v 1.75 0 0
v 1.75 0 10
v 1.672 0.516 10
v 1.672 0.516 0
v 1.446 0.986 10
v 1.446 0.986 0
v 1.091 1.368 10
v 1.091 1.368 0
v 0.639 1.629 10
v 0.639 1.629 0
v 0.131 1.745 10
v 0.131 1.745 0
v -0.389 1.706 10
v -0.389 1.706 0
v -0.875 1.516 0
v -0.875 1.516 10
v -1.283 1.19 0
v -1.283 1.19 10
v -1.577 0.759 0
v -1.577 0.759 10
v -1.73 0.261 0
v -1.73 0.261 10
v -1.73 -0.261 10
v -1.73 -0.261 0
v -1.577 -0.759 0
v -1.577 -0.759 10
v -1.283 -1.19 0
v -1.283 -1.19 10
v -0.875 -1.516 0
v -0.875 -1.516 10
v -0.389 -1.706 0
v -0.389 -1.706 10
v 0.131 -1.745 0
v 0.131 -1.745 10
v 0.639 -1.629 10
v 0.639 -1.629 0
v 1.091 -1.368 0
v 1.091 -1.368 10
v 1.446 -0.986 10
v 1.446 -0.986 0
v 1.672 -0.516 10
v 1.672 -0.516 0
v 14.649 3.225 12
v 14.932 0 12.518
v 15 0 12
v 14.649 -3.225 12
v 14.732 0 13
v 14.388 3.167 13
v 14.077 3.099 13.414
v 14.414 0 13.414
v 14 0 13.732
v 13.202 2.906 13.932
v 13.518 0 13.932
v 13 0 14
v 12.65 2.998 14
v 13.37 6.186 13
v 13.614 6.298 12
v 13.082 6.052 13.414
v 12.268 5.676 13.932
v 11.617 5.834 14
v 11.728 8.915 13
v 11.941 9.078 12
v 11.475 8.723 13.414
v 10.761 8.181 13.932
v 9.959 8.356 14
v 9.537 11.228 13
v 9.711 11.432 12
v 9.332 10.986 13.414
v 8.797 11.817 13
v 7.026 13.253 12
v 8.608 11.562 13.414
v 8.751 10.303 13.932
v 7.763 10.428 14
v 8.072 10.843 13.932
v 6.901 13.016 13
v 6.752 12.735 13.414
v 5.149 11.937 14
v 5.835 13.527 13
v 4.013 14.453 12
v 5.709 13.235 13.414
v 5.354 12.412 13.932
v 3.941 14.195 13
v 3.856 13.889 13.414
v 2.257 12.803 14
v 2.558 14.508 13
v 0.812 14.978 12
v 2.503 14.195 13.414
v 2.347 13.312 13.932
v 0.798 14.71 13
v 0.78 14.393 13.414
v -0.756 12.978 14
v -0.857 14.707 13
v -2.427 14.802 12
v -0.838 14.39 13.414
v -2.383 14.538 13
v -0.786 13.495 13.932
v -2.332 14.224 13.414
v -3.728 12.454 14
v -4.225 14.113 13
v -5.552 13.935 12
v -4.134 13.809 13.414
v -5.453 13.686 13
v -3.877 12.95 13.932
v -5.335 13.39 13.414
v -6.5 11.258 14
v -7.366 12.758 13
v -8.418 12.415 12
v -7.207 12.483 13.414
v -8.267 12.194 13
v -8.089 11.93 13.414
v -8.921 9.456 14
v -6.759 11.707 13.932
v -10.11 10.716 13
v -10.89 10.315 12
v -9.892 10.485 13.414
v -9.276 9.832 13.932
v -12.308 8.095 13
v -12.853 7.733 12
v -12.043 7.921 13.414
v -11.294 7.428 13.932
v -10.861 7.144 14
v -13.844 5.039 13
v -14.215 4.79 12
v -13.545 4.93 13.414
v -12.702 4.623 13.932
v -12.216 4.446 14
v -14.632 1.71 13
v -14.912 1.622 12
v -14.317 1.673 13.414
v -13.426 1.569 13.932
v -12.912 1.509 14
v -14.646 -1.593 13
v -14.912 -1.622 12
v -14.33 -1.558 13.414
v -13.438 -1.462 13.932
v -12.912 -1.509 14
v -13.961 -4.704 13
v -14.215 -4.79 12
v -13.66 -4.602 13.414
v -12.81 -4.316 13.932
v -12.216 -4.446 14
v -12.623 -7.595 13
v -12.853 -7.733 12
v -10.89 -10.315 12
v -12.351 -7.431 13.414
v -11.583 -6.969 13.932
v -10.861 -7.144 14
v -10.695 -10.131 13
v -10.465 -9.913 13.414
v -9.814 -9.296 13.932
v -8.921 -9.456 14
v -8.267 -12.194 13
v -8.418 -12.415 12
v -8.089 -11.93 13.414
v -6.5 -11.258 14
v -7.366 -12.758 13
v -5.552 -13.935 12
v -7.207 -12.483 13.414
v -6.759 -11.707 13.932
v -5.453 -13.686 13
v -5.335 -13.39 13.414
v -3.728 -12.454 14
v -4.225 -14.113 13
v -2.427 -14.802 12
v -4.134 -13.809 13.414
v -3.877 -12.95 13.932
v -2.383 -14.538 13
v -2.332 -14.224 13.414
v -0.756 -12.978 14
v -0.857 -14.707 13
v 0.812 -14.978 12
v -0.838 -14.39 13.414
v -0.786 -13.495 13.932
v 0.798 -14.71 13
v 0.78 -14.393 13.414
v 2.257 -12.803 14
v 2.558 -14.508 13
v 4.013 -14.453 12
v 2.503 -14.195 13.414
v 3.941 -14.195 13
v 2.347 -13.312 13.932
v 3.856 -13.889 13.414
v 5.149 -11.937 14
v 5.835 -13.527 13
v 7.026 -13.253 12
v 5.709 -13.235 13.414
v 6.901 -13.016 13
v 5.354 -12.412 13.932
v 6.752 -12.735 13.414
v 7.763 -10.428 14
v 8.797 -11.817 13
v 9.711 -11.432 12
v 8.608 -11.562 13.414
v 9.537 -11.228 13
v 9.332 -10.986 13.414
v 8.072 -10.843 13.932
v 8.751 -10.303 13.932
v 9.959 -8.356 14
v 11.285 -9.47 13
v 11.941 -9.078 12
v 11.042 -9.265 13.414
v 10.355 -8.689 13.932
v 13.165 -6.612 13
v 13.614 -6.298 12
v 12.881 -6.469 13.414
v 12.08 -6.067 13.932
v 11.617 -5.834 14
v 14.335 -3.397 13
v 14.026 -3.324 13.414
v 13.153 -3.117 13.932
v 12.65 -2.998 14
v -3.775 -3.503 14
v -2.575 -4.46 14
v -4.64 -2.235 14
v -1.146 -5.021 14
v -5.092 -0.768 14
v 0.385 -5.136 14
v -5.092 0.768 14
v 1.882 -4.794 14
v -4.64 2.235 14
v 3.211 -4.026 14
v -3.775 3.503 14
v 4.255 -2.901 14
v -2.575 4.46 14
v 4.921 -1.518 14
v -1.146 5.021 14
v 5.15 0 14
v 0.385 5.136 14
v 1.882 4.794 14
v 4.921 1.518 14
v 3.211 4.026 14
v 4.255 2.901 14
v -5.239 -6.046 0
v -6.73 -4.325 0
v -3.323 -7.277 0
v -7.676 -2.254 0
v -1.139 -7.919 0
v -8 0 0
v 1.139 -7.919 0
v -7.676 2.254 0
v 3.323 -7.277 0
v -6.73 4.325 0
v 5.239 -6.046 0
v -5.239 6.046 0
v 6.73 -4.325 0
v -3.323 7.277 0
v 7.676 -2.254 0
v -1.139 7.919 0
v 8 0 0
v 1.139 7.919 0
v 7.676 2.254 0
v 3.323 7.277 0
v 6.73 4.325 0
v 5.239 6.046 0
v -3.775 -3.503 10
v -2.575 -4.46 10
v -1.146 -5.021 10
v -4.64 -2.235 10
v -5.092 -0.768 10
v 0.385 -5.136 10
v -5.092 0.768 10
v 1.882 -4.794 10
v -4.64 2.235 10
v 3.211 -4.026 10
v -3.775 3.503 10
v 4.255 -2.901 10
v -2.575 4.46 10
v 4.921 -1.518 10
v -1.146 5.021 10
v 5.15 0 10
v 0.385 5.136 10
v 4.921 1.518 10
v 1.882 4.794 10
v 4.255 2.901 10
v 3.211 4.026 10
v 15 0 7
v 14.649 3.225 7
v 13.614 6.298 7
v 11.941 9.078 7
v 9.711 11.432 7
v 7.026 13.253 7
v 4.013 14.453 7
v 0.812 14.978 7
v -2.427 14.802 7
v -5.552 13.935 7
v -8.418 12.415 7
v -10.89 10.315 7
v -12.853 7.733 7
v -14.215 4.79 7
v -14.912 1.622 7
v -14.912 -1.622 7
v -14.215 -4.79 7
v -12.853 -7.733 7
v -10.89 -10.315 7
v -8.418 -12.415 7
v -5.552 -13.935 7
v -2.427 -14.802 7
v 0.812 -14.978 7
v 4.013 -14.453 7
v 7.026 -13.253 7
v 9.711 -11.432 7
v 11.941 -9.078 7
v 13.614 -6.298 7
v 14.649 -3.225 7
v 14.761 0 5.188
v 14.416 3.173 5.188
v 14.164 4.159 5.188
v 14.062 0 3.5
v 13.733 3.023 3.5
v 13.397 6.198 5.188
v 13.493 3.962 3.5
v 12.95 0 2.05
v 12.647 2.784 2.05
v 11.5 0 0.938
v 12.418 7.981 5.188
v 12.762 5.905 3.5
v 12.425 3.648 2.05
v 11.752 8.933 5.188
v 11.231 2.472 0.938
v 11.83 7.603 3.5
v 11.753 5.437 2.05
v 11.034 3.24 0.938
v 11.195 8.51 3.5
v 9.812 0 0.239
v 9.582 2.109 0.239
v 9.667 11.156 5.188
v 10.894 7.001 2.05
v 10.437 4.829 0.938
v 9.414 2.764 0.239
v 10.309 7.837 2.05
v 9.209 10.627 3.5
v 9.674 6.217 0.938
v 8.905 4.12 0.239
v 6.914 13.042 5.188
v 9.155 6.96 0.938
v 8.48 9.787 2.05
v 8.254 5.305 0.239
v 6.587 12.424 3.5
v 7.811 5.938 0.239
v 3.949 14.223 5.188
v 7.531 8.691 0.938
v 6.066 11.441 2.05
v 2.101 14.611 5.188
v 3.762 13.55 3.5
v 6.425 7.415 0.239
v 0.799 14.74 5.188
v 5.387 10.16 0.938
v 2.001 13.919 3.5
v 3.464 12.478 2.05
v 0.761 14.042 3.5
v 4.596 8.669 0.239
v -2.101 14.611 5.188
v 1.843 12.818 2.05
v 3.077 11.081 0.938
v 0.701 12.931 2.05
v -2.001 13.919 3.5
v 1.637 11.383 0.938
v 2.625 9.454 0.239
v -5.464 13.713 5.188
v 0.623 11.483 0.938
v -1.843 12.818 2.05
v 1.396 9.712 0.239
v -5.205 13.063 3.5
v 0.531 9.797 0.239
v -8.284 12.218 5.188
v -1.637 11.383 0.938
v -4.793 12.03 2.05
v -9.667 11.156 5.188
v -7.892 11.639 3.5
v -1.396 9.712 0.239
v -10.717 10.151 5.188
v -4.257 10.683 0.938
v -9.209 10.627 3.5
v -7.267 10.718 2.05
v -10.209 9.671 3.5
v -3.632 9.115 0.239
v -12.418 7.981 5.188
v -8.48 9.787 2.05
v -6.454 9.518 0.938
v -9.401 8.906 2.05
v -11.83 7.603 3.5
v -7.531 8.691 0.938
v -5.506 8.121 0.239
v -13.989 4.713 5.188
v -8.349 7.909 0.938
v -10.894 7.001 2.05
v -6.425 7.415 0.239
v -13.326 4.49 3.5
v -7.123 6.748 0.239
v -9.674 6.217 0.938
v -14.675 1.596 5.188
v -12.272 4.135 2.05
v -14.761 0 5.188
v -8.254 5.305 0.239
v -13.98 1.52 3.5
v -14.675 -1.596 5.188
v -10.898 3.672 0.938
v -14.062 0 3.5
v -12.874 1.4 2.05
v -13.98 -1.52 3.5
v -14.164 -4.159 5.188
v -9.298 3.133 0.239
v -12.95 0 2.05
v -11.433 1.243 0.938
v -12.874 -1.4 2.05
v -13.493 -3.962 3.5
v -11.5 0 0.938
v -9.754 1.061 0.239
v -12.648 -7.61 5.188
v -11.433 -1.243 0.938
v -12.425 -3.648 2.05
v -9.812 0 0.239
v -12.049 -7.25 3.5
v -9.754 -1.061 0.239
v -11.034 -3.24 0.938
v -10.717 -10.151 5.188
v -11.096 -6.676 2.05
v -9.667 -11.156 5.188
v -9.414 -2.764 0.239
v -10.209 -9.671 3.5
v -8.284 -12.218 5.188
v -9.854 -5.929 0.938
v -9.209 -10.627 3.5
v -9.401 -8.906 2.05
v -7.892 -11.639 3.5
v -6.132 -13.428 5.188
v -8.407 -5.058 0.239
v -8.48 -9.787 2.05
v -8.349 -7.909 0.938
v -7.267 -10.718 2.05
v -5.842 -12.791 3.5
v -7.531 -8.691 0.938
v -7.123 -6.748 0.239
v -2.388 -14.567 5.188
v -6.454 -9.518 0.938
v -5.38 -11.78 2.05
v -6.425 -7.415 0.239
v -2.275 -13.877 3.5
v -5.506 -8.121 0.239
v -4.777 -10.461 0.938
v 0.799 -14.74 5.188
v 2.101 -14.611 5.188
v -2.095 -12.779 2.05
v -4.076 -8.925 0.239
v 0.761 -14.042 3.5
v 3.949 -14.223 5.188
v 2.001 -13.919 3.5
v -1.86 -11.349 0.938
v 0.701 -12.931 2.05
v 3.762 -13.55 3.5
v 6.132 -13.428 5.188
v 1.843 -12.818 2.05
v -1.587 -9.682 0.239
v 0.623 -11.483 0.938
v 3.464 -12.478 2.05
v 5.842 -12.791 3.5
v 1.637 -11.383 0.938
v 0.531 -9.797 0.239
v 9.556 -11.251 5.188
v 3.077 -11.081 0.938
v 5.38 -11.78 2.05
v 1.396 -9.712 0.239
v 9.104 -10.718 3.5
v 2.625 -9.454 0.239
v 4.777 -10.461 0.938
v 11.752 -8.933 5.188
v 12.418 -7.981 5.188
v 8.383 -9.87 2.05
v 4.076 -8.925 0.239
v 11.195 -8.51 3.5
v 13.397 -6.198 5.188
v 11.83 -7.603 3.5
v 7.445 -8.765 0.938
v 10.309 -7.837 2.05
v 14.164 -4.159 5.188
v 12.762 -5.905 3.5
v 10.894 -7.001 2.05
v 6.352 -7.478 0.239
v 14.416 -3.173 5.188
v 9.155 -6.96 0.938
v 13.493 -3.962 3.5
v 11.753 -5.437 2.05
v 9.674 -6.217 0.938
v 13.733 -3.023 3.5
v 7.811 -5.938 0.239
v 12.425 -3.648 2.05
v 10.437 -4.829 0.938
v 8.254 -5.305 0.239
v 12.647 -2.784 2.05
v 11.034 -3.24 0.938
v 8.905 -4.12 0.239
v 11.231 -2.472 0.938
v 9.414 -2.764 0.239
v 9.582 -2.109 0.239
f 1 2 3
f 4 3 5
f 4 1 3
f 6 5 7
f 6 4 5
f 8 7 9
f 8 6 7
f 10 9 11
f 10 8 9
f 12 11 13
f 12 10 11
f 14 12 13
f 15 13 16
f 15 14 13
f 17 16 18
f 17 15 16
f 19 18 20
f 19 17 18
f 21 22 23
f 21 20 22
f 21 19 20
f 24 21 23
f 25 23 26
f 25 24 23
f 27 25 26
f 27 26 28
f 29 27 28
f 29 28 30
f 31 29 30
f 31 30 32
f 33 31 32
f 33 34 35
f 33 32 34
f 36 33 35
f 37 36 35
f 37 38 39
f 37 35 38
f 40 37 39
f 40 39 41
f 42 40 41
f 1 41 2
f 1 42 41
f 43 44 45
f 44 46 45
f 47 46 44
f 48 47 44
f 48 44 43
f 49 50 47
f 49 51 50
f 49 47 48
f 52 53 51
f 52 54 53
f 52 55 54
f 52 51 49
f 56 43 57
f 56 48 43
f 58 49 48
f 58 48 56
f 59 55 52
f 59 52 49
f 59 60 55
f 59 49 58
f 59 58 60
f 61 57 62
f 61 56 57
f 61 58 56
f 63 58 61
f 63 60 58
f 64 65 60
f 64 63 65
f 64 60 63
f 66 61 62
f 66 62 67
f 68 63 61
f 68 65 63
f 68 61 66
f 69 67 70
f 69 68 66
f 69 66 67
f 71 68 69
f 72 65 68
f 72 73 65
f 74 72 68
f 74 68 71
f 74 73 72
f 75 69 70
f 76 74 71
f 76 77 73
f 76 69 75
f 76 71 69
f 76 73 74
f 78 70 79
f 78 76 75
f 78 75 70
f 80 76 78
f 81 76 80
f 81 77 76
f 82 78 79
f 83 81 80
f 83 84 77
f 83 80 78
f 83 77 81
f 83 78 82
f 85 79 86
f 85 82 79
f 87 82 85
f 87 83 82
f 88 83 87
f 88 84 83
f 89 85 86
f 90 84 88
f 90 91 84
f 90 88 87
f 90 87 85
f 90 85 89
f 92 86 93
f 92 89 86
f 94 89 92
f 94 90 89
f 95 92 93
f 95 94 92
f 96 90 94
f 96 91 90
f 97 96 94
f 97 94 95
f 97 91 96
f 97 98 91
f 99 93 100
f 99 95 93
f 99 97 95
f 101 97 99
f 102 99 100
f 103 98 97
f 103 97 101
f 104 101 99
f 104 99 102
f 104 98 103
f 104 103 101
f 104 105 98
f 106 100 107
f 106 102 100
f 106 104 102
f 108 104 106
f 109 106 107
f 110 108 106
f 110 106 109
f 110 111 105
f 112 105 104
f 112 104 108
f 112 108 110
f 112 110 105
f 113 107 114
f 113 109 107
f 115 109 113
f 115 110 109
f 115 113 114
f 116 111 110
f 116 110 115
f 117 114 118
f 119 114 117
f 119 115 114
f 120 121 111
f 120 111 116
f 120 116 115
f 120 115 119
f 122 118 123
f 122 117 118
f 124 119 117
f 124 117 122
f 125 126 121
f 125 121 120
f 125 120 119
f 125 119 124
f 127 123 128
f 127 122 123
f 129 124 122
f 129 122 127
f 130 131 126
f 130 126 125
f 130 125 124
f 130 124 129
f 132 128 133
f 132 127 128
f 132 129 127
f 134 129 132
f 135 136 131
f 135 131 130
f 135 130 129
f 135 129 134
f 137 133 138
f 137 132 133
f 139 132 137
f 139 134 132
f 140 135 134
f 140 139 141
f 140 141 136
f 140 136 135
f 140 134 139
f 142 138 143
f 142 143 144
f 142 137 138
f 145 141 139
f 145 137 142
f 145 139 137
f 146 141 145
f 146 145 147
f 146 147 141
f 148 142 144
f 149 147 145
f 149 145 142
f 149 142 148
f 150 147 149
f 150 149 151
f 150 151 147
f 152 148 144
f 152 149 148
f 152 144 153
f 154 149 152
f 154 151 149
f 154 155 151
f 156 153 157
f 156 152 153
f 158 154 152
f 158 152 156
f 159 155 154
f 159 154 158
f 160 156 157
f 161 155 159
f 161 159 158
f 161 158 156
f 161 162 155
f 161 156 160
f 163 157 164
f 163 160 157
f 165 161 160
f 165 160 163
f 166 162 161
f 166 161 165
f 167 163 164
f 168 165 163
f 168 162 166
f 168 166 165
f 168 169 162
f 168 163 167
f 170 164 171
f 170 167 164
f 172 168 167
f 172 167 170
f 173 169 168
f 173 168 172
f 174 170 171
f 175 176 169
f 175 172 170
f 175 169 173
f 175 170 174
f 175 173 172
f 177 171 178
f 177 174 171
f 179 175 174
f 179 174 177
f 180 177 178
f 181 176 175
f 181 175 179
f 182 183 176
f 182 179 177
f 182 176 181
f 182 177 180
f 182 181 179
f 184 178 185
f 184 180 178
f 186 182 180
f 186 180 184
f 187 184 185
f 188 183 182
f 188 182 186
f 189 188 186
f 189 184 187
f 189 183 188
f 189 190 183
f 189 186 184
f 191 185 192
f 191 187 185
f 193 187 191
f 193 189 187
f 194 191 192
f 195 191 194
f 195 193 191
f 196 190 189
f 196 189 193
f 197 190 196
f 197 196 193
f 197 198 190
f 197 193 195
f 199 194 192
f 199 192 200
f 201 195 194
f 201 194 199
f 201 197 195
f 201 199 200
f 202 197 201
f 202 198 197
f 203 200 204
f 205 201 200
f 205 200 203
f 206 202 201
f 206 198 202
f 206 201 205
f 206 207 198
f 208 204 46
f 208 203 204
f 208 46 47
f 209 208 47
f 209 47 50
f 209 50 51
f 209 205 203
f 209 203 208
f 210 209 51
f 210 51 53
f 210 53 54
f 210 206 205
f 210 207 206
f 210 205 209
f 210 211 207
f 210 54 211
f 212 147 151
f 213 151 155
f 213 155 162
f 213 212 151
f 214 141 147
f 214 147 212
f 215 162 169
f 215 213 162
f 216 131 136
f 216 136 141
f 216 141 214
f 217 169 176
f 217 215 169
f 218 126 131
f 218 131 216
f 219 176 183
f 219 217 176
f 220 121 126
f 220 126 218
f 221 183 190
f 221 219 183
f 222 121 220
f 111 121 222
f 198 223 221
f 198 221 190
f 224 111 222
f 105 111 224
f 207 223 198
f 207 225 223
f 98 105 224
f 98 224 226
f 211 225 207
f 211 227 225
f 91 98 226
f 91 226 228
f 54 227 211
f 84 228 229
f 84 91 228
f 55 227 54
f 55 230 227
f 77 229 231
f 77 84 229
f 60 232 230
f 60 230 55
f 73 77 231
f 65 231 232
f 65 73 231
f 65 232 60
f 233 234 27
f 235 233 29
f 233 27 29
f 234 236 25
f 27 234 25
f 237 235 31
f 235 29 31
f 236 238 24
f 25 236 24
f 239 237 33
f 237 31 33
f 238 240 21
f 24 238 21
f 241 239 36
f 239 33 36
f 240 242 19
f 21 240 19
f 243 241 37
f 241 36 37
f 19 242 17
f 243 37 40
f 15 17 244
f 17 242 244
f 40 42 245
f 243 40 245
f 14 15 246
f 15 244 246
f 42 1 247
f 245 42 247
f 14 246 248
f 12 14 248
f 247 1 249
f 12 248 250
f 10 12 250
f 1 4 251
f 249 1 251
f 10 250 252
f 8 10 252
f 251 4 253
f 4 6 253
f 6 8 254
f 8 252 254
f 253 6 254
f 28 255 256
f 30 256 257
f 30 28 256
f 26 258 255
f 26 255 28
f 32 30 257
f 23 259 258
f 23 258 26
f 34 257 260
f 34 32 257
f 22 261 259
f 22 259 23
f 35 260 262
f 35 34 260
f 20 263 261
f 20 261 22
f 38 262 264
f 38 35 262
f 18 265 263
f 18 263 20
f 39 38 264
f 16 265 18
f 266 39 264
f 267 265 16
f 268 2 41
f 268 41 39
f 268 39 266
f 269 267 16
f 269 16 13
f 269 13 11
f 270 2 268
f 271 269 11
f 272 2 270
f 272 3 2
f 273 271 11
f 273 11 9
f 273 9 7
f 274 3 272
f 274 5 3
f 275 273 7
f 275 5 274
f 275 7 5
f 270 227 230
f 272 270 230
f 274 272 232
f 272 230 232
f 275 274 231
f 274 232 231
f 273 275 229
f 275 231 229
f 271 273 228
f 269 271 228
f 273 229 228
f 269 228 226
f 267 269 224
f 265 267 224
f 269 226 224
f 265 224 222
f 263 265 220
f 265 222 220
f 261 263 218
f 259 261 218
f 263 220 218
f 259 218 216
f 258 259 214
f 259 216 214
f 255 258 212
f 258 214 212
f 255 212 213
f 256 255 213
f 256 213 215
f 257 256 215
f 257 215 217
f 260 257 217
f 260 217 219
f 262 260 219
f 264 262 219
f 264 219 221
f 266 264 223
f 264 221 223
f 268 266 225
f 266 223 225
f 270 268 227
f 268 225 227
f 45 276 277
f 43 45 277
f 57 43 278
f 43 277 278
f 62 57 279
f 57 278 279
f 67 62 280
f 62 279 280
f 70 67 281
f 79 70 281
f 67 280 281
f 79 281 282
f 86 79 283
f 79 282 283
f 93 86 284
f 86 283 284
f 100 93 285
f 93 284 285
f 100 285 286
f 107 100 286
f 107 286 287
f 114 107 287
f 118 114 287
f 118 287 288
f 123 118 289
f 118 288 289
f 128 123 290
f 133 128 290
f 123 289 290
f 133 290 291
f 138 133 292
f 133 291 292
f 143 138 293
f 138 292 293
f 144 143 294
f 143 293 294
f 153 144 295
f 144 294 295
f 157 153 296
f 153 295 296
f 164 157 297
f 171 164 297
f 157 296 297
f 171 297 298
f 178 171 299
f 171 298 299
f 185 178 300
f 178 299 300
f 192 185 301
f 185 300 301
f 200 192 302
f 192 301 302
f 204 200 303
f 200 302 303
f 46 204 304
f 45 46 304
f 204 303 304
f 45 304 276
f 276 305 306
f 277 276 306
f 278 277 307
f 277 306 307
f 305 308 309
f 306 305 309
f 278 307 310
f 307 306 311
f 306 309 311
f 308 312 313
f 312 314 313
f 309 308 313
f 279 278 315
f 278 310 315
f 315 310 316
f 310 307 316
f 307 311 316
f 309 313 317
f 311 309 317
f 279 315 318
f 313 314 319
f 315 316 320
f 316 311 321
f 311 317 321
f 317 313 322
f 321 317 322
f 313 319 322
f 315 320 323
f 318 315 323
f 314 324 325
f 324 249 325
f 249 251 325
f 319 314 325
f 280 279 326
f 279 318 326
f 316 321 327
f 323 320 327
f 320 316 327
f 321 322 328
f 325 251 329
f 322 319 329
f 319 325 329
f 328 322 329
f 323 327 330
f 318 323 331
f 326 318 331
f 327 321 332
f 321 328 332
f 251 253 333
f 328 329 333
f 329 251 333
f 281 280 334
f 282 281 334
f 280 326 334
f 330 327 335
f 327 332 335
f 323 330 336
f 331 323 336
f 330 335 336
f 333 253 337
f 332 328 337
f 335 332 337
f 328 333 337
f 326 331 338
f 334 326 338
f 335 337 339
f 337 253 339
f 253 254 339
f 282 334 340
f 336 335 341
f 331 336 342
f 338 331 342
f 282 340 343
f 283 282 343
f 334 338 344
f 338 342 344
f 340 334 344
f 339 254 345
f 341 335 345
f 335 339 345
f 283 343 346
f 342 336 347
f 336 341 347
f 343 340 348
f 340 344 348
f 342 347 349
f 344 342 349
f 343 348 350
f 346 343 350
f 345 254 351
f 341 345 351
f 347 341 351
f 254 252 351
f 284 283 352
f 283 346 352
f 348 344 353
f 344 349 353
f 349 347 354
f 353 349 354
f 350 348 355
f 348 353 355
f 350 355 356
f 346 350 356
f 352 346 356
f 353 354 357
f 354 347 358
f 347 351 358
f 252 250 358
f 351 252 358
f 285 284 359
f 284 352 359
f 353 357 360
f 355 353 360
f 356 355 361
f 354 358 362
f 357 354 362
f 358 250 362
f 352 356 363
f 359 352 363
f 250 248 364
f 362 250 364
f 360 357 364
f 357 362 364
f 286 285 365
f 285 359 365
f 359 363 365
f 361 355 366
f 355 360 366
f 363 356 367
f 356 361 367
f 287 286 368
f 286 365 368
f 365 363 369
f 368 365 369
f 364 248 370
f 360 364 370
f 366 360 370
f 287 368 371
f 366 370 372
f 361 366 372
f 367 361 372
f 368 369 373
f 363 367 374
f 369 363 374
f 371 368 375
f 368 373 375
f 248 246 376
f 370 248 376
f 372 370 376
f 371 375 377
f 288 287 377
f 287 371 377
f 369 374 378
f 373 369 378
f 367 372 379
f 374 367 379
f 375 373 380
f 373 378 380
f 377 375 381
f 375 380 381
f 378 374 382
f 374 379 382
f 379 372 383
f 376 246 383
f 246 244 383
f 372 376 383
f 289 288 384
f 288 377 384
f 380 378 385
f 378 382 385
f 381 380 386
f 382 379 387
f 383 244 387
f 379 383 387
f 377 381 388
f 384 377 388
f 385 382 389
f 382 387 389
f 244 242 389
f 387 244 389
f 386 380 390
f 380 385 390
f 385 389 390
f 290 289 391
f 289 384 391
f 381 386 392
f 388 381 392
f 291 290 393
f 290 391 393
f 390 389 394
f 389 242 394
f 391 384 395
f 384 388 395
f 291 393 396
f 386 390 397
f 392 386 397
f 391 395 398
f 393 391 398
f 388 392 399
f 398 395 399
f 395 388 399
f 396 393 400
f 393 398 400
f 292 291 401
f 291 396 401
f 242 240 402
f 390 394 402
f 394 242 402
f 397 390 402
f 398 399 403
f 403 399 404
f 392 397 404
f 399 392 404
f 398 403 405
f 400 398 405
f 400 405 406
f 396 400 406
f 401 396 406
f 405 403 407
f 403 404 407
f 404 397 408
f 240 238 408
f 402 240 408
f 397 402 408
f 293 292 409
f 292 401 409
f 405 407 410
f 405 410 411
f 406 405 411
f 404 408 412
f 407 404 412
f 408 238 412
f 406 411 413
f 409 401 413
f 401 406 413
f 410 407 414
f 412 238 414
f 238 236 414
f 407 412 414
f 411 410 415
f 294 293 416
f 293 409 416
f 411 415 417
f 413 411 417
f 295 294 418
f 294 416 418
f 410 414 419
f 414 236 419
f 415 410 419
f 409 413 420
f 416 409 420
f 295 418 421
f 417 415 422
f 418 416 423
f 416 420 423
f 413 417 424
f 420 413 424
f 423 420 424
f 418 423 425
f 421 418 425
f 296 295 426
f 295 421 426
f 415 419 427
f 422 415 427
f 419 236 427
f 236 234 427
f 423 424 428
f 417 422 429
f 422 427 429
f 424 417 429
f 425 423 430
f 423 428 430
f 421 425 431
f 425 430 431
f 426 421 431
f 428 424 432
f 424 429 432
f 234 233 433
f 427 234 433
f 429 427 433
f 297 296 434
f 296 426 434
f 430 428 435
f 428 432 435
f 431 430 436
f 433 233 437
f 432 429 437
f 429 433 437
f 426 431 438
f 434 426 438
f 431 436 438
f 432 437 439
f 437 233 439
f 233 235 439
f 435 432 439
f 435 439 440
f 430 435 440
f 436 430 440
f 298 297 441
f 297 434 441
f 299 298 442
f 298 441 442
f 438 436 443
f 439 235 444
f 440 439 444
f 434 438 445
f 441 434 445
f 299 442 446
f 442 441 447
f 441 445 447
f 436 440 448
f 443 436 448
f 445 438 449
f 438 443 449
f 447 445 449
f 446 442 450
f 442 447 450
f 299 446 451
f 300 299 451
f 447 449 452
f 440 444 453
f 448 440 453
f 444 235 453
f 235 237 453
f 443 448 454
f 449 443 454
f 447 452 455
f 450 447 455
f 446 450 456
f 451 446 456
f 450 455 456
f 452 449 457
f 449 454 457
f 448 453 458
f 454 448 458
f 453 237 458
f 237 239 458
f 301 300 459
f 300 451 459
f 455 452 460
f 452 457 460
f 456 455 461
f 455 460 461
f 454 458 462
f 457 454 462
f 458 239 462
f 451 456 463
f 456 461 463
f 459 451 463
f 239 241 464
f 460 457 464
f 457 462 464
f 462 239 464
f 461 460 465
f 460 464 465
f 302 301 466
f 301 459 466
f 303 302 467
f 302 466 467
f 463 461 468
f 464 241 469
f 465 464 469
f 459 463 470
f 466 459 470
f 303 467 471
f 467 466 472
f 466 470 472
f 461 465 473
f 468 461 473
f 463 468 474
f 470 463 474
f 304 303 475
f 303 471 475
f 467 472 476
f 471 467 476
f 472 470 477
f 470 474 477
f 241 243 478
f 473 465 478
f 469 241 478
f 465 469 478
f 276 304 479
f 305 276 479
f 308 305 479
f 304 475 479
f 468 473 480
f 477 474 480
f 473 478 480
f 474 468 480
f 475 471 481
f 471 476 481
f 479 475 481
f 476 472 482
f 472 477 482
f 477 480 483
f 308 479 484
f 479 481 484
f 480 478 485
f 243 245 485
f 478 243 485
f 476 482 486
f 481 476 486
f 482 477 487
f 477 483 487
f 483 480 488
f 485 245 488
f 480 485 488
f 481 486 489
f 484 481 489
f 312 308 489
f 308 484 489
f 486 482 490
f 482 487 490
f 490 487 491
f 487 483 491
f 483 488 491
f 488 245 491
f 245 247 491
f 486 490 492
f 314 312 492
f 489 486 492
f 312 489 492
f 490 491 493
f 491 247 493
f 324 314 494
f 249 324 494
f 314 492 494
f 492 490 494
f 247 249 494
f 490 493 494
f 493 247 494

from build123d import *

# Parameters (mm, degrees)
SKETCH_1_R          = 15
SKETCH_1_R_2        = 1.75
EXTRUDE_1_DEPTH     = 14
SKETCH_2_R          = 5.15
CUT_EXTRUDE_1_DEPTH = 4
FILLET_1_R          = 2
FILLET_2_R          = 7


with BuildPart() as part:
    # Эскиз1 → Бобышка-Вытянуть1 (new body)
    with BuildSketch(Plane.XY):
        Circle(SKETCH_1_R)
        Circle(SKETCH_1_R_2, mode=Mode.SUBTRACT)
    extrude(amount=EXTRUDE_1_DEPTH)

    # Эскиз2 → Вырез-Вытянуть1 (cut)
    with BuildSketch(Plane.XY.offset(14)):
        Circle(SKETCH_2_R)
    extrude(amount=-CUT_EXTRUDE_1_DEPTH, mode=Mode.SUBTRACT)

    # Скругление1
    fillet_1_edges = [part.edges().sort_by_distance(p)[0] for p in [
        (-15, 0, 14),
    ]]
    fillet(fillet_1_edges, radius=FILLET_1_R)

    # Скругление2
    fillet_2_edges = [part.edges().sort_by_distance(p)[0] for p in [
        (-15, 0, 0),
    ]]
    fillet(fillet_2_edges, radius=FILLET_2_R)


solid = part.part
